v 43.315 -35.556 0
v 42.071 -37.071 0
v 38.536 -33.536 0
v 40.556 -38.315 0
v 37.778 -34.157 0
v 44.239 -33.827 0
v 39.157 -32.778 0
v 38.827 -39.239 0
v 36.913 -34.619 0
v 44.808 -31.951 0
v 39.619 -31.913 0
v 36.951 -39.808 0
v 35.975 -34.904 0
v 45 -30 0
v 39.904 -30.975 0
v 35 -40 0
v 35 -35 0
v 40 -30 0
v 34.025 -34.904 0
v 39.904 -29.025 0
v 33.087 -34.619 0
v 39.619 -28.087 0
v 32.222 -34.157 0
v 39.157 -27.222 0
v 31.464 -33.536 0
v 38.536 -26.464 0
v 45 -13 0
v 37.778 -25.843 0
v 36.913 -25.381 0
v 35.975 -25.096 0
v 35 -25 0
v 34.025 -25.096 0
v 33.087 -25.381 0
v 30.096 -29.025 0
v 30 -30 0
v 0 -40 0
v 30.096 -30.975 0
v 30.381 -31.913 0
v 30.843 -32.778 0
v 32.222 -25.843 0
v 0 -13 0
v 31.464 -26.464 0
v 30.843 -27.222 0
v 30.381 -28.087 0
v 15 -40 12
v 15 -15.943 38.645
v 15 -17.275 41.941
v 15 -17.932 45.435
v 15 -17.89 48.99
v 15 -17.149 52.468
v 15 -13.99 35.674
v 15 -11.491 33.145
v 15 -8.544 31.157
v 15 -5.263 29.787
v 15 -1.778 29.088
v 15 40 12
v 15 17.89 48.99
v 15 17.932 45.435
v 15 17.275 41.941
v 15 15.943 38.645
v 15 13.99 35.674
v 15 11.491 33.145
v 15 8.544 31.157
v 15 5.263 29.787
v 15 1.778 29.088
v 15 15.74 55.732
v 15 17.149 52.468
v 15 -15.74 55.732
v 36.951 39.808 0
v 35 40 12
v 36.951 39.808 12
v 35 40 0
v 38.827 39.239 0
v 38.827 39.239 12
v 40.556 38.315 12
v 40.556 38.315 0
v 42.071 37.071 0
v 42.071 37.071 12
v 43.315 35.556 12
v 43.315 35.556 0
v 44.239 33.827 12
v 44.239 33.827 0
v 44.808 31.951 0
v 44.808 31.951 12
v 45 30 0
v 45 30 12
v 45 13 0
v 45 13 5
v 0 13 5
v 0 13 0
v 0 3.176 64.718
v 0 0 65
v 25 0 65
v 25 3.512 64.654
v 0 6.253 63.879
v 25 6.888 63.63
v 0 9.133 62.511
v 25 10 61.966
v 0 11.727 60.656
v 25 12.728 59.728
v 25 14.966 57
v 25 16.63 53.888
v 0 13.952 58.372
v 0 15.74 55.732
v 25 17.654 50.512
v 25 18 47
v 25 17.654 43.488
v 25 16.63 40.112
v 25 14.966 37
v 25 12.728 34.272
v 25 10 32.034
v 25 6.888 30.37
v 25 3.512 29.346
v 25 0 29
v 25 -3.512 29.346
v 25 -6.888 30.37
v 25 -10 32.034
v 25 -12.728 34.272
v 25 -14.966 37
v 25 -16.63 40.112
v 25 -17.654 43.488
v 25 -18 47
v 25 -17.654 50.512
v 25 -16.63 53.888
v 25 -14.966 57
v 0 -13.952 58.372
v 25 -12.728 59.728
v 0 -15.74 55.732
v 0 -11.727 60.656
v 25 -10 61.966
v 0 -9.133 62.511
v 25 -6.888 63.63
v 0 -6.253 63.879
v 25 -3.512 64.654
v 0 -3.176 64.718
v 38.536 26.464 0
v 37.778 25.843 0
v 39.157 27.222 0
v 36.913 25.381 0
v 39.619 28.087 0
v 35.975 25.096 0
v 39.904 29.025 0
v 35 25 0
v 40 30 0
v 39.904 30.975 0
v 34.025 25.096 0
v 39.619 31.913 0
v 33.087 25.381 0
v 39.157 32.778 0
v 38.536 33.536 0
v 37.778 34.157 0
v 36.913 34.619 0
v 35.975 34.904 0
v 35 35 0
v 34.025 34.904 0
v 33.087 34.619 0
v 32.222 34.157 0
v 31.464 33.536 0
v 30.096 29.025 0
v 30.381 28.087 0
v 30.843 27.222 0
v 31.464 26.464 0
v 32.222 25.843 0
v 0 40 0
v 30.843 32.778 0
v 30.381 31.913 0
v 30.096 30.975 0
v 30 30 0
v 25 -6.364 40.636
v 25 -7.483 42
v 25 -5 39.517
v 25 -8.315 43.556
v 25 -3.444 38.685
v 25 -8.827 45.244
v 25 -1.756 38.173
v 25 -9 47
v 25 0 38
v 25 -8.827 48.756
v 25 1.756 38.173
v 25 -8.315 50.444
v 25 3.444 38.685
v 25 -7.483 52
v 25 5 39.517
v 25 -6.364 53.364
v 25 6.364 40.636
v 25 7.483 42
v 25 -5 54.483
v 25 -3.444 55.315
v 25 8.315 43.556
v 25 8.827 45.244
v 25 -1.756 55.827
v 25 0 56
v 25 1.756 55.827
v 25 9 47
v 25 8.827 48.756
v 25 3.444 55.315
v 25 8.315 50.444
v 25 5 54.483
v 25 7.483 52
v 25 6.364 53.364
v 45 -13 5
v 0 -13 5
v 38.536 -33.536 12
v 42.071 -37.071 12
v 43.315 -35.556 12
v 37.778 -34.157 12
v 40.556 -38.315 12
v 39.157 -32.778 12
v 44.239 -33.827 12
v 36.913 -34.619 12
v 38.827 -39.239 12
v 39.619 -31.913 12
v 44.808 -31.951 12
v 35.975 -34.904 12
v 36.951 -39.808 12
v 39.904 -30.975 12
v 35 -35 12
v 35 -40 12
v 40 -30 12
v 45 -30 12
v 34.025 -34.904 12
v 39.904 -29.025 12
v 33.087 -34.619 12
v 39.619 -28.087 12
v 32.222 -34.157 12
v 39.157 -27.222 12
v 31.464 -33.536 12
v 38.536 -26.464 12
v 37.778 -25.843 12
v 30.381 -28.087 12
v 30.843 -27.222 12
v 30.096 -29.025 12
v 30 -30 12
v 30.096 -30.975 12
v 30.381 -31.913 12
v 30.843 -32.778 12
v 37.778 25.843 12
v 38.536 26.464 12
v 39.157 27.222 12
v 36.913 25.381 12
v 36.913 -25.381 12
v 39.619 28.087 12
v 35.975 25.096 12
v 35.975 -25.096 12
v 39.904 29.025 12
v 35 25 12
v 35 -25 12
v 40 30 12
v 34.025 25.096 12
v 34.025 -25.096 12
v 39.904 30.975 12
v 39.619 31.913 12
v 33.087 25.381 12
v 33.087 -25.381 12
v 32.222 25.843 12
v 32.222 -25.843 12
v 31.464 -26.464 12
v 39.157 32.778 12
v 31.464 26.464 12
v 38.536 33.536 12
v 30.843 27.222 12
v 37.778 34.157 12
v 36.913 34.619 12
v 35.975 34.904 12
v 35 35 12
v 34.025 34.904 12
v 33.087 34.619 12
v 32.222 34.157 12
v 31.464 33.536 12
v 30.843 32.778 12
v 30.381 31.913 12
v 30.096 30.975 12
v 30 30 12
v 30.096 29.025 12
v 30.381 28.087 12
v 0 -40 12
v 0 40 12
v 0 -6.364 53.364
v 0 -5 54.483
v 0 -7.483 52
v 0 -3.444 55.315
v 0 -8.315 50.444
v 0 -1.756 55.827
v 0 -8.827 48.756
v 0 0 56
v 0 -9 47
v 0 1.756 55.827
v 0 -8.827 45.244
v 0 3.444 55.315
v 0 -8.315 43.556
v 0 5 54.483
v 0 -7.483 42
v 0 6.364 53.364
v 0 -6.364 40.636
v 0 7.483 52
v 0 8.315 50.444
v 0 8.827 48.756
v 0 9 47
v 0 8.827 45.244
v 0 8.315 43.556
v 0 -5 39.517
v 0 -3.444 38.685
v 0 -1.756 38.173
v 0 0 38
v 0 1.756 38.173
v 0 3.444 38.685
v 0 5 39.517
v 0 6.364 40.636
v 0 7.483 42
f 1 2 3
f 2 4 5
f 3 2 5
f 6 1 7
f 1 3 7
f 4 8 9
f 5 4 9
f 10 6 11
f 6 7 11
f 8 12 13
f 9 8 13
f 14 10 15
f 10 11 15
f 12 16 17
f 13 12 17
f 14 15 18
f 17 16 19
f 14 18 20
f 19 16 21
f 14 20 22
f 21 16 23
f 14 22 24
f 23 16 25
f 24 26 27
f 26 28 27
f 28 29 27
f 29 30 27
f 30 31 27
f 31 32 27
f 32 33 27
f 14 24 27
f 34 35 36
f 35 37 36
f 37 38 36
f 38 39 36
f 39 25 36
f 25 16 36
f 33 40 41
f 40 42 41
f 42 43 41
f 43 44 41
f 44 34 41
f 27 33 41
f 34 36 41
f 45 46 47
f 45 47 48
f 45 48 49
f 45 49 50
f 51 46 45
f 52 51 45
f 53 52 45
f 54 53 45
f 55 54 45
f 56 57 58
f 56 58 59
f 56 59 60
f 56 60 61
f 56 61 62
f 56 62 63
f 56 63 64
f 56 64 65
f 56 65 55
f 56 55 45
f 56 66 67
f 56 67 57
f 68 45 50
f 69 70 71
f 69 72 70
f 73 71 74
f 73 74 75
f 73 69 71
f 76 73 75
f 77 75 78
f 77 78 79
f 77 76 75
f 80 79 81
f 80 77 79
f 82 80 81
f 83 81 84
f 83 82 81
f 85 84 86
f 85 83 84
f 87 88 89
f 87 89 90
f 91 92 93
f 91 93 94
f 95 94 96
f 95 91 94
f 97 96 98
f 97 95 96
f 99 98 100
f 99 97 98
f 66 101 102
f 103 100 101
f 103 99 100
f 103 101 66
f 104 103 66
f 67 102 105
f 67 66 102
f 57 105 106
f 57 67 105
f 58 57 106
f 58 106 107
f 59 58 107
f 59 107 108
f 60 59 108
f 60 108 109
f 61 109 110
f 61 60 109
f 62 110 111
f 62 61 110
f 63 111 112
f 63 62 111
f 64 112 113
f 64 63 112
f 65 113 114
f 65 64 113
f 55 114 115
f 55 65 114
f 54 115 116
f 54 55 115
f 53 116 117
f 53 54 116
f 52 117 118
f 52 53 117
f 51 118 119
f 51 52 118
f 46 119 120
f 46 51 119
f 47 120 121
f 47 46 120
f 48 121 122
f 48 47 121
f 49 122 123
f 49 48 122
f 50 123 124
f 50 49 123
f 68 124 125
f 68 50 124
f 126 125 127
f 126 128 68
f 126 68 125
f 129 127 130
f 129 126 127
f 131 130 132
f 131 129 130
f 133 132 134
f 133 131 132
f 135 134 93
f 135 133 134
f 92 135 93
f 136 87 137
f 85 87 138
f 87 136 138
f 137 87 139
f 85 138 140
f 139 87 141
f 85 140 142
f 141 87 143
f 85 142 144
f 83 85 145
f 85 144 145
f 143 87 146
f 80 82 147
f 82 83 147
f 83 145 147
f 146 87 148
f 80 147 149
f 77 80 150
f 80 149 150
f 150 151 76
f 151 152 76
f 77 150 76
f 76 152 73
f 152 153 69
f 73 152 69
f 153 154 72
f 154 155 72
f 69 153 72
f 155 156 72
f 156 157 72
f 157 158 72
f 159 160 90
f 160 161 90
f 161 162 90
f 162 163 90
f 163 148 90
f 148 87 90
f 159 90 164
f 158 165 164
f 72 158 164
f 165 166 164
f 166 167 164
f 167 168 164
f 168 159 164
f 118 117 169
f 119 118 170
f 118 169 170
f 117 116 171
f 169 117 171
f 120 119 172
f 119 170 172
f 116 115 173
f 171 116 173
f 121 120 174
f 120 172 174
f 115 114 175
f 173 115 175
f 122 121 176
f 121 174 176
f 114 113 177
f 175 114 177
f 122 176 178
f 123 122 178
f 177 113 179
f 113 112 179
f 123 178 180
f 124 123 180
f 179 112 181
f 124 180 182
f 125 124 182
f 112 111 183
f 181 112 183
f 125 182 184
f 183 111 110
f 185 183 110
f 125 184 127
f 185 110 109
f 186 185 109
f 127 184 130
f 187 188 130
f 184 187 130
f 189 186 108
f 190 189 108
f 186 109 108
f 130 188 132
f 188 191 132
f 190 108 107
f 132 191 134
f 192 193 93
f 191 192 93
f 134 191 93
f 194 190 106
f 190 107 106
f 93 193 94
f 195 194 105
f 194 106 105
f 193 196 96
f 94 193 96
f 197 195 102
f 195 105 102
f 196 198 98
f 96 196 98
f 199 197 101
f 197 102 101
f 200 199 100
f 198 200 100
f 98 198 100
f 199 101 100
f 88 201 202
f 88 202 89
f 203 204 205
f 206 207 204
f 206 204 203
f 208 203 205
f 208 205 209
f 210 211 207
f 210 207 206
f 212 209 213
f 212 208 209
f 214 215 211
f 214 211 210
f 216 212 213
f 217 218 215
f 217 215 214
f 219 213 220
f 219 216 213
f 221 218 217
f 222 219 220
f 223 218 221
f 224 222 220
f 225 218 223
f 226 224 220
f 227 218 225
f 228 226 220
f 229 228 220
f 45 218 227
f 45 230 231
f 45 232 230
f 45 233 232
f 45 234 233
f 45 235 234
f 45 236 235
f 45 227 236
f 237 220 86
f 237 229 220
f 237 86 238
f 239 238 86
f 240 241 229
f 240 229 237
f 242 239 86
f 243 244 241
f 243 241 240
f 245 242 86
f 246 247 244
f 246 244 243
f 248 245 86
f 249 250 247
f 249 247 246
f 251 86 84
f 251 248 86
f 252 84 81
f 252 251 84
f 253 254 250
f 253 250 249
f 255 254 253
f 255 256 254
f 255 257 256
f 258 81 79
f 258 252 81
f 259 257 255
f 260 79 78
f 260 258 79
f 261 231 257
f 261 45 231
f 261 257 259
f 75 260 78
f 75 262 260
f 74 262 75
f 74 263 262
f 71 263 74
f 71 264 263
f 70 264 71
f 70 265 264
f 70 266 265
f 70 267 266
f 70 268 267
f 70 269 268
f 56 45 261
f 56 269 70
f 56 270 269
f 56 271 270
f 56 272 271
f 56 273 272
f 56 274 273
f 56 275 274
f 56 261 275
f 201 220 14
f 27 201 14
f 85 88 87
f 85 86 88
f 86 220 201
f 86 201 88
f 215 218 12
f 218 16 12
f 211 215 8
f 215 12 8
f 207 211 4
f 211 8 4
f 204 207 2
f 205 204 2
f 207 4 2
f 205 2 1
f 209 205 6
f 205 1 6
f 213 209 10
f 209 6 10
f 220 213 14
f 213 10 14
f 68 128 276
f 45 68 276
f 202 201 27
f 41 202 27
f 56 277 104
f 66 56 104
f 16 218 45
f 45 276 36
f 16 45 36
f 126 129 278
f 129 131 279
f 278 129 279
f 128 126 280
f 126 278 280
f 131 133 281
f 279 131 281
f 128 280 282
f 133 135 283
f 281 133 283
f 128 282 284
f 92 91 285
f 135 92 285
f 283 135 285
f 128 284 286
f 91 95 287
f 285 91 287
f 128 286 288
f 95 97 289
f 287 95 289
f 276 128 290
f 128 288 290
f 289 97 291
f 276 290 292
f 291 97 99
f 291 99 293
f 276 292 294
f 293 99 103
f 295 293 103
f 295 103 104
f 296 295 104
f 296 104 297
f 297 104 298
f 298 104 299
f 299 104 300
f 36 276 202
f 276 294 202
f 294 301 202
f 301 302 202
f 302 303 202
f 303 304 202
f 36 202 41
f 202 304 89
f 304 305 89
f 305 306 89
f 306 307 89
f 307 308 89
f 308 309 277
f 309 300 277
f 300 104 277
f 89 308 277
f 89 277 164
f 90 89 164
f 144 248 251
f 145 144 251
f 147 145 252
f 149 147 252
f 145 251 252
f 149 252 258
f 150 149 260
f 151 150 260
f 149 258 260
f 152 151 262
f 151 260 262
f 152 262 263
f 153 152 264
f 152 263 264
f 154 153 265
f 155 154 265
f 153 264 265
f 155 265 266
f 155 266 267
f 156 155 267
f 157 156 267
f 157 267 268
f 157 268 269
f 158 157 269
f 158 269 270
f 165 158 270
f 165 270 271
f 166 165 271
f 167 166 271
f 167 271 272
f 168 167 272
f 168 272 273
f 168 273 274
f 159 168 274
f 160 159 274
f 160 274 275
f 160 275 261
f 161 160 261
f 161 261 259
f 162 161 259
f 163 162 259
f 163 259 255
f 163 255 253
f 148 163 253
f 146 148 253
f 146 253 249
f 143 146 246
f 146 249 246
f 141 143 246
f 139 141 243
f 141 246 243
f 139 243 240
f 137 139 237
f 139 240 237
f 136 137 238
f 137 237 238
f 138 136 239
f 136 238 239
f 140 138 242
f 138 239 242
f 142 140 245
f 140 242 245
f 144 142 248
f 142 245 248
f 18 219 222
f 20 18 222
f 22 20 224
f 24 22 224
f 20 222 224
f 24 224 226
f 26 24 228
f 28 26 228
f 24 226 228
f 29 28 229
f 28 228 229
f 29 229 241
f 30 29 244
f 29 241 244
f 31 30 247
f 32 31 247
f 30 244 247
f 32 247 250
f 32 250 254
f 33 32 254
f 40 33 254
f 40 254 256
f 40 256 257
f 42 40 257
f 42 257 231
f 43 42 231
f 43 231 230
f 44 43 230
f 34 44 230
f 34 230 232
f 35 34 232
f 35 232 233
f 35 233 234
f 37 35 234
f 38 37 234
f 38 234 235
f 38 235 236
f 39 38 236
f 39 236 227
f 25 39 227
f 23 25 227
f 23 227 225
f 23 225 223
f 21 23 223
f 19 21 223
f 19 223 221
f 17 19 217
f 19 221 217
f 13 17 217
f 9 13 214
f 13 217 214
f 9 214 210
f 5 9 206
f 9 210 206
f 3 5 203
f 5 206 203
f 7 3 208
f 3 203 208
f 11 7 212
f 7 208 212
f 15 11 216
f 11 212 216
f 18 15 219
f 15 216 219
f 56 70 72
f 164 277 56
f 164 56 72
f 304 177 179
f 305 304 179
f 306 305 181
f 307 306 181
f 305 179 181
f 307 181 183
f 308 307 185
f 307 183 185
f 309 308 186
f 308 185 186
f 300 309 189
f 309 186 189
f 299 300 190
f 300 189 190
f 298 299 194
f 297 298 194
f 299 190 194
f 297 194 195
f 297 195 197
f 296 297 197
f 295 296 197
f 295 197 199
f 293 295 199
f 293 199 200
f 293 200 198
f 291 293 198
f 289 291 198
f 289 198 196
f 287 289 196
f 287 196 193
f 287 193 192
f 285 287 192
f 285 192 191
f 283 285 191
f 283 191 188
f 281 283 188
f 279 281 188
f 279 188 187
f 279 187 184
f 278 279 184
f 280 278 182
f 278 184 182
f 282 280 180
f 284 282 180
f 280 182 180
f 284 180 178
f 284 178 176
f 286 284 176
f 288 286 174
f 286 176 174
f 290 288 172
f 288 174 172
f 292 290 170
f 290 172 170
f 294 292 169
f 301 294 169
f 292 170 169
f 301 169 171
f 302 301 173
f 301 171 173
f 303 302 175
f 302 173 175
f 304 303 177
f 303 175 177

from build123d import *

# Parameters (mm, degrees)
SKETCH_2_W          = 12
SKETCH_2_H          = 80
EXTRUDE_1_DEPTH     = 45
FILLET_1_R          = 10
SKETCH_3_R          = 5
CUT_EXTRUDE_1_DEPTH = 62.392181913
SKETCH_5_W          = 10
SKETCH_5_H          = 26
CUT_EXTRUDE_2_DEPTH = 62.392181913
SKETCH_6_R          = 18
EXTRUDE_2_DEPTH     = 25
EXTRUDE_3_DEPTH     = 15
SKETCH_8_R          = 9
CUT_EXTRUDE_3_DEPTH = 81.311892021


with BuildPart() as part:
    # 草图2 → 凸台-拉伸1 (new body)
    with BuildSketch(Plane(origin=(0, 0, 0), x_dir=(0, 0, -1), z_dir=(1, 0, 0))):
        with Locations((-6, 0)):
            Rectangle(SKETCH_2_W, SKETCH_2_H)
    extrude(amount=EXTRUDE_1_DEPTH)

    # 圆角1
    fillet_1_edges = [part.edges().sort_by_distance(p)[0] for p in [
        (45, -40, 6),
        (45, 40, 6),
    ]]
    fillet(fillet_1_edges, radius=FILLET_1_R)

    # 草图3 → 切除-拉伸1 (cut, through all)
    with BuildSketch(Plane.XY.offset(12)):
        with Locations((35, 30)):
            Circle(SKETCH_3_R)
        with Locations((35, -30)):
            Circle(SKETCH_3_R)
    extrude(amount=-CUT_EXTRUDE_1_DEPTH, mode=Mode.SUBTRACT)

    # 草图5 → 切除-拉伸2 (cut, through all)
    with BuildSketch(Plane(origin=(45, 0, 0), x_dir=(0, 0, -1), z_dir=(1, 0, 0))):
        Rectangle(SKETCH_5_W, SKETCH_5_H)
    extrude(amount=-CUT_EXTRUDE_2_DEPTH, mode=Mode.SUBTRACT)



with BuildPart() as body_2:
    # 草图6 → 凸台-拉伸2 (new body)
    with BuildSketch(Plane.ZY):
        with Locations((47, 0)):
            Circle(SKETCH_6_R)
    extrude(amount=-EXTRUDE_2_DEPTH)


with BuildPart() as part_1:
    add(part.part)

    add(body_2.part)  # 凸台-拉伸3 merges body 2
    # 草图7 → 凸台-拉伸3 (add)
    with BuildSketch(Plane.ZY):
        with BuildLine():
            Line((12, 40), (55.731751958, 15.740282963))
            ThreePointArc((55.731751958, 15.740282963), (65, 0), (55.731751958, -15.740282963))
            Line((55.731751958, -15.740282963), (12, -40))
            Line((12, -40), (12, 40))
        make_face()
    extrude(amount=-EXTRUDE_3_DEPTH)

    # 草图8 → 切除-拉伸3 (cut, through all)
    with BuildSketch(Plane(origin=(25, 0, 0), x_dir=(0, 0, -1), z_dir=(1, 0, 0))):
        with Locations((-47, 0)):
            Circle(SKETCH_8_R)
    extrude(amount=-CUT_EXTRUDE_3_DEPTH, mode=Mode.SUBTRACT)


solid = part_1.part
